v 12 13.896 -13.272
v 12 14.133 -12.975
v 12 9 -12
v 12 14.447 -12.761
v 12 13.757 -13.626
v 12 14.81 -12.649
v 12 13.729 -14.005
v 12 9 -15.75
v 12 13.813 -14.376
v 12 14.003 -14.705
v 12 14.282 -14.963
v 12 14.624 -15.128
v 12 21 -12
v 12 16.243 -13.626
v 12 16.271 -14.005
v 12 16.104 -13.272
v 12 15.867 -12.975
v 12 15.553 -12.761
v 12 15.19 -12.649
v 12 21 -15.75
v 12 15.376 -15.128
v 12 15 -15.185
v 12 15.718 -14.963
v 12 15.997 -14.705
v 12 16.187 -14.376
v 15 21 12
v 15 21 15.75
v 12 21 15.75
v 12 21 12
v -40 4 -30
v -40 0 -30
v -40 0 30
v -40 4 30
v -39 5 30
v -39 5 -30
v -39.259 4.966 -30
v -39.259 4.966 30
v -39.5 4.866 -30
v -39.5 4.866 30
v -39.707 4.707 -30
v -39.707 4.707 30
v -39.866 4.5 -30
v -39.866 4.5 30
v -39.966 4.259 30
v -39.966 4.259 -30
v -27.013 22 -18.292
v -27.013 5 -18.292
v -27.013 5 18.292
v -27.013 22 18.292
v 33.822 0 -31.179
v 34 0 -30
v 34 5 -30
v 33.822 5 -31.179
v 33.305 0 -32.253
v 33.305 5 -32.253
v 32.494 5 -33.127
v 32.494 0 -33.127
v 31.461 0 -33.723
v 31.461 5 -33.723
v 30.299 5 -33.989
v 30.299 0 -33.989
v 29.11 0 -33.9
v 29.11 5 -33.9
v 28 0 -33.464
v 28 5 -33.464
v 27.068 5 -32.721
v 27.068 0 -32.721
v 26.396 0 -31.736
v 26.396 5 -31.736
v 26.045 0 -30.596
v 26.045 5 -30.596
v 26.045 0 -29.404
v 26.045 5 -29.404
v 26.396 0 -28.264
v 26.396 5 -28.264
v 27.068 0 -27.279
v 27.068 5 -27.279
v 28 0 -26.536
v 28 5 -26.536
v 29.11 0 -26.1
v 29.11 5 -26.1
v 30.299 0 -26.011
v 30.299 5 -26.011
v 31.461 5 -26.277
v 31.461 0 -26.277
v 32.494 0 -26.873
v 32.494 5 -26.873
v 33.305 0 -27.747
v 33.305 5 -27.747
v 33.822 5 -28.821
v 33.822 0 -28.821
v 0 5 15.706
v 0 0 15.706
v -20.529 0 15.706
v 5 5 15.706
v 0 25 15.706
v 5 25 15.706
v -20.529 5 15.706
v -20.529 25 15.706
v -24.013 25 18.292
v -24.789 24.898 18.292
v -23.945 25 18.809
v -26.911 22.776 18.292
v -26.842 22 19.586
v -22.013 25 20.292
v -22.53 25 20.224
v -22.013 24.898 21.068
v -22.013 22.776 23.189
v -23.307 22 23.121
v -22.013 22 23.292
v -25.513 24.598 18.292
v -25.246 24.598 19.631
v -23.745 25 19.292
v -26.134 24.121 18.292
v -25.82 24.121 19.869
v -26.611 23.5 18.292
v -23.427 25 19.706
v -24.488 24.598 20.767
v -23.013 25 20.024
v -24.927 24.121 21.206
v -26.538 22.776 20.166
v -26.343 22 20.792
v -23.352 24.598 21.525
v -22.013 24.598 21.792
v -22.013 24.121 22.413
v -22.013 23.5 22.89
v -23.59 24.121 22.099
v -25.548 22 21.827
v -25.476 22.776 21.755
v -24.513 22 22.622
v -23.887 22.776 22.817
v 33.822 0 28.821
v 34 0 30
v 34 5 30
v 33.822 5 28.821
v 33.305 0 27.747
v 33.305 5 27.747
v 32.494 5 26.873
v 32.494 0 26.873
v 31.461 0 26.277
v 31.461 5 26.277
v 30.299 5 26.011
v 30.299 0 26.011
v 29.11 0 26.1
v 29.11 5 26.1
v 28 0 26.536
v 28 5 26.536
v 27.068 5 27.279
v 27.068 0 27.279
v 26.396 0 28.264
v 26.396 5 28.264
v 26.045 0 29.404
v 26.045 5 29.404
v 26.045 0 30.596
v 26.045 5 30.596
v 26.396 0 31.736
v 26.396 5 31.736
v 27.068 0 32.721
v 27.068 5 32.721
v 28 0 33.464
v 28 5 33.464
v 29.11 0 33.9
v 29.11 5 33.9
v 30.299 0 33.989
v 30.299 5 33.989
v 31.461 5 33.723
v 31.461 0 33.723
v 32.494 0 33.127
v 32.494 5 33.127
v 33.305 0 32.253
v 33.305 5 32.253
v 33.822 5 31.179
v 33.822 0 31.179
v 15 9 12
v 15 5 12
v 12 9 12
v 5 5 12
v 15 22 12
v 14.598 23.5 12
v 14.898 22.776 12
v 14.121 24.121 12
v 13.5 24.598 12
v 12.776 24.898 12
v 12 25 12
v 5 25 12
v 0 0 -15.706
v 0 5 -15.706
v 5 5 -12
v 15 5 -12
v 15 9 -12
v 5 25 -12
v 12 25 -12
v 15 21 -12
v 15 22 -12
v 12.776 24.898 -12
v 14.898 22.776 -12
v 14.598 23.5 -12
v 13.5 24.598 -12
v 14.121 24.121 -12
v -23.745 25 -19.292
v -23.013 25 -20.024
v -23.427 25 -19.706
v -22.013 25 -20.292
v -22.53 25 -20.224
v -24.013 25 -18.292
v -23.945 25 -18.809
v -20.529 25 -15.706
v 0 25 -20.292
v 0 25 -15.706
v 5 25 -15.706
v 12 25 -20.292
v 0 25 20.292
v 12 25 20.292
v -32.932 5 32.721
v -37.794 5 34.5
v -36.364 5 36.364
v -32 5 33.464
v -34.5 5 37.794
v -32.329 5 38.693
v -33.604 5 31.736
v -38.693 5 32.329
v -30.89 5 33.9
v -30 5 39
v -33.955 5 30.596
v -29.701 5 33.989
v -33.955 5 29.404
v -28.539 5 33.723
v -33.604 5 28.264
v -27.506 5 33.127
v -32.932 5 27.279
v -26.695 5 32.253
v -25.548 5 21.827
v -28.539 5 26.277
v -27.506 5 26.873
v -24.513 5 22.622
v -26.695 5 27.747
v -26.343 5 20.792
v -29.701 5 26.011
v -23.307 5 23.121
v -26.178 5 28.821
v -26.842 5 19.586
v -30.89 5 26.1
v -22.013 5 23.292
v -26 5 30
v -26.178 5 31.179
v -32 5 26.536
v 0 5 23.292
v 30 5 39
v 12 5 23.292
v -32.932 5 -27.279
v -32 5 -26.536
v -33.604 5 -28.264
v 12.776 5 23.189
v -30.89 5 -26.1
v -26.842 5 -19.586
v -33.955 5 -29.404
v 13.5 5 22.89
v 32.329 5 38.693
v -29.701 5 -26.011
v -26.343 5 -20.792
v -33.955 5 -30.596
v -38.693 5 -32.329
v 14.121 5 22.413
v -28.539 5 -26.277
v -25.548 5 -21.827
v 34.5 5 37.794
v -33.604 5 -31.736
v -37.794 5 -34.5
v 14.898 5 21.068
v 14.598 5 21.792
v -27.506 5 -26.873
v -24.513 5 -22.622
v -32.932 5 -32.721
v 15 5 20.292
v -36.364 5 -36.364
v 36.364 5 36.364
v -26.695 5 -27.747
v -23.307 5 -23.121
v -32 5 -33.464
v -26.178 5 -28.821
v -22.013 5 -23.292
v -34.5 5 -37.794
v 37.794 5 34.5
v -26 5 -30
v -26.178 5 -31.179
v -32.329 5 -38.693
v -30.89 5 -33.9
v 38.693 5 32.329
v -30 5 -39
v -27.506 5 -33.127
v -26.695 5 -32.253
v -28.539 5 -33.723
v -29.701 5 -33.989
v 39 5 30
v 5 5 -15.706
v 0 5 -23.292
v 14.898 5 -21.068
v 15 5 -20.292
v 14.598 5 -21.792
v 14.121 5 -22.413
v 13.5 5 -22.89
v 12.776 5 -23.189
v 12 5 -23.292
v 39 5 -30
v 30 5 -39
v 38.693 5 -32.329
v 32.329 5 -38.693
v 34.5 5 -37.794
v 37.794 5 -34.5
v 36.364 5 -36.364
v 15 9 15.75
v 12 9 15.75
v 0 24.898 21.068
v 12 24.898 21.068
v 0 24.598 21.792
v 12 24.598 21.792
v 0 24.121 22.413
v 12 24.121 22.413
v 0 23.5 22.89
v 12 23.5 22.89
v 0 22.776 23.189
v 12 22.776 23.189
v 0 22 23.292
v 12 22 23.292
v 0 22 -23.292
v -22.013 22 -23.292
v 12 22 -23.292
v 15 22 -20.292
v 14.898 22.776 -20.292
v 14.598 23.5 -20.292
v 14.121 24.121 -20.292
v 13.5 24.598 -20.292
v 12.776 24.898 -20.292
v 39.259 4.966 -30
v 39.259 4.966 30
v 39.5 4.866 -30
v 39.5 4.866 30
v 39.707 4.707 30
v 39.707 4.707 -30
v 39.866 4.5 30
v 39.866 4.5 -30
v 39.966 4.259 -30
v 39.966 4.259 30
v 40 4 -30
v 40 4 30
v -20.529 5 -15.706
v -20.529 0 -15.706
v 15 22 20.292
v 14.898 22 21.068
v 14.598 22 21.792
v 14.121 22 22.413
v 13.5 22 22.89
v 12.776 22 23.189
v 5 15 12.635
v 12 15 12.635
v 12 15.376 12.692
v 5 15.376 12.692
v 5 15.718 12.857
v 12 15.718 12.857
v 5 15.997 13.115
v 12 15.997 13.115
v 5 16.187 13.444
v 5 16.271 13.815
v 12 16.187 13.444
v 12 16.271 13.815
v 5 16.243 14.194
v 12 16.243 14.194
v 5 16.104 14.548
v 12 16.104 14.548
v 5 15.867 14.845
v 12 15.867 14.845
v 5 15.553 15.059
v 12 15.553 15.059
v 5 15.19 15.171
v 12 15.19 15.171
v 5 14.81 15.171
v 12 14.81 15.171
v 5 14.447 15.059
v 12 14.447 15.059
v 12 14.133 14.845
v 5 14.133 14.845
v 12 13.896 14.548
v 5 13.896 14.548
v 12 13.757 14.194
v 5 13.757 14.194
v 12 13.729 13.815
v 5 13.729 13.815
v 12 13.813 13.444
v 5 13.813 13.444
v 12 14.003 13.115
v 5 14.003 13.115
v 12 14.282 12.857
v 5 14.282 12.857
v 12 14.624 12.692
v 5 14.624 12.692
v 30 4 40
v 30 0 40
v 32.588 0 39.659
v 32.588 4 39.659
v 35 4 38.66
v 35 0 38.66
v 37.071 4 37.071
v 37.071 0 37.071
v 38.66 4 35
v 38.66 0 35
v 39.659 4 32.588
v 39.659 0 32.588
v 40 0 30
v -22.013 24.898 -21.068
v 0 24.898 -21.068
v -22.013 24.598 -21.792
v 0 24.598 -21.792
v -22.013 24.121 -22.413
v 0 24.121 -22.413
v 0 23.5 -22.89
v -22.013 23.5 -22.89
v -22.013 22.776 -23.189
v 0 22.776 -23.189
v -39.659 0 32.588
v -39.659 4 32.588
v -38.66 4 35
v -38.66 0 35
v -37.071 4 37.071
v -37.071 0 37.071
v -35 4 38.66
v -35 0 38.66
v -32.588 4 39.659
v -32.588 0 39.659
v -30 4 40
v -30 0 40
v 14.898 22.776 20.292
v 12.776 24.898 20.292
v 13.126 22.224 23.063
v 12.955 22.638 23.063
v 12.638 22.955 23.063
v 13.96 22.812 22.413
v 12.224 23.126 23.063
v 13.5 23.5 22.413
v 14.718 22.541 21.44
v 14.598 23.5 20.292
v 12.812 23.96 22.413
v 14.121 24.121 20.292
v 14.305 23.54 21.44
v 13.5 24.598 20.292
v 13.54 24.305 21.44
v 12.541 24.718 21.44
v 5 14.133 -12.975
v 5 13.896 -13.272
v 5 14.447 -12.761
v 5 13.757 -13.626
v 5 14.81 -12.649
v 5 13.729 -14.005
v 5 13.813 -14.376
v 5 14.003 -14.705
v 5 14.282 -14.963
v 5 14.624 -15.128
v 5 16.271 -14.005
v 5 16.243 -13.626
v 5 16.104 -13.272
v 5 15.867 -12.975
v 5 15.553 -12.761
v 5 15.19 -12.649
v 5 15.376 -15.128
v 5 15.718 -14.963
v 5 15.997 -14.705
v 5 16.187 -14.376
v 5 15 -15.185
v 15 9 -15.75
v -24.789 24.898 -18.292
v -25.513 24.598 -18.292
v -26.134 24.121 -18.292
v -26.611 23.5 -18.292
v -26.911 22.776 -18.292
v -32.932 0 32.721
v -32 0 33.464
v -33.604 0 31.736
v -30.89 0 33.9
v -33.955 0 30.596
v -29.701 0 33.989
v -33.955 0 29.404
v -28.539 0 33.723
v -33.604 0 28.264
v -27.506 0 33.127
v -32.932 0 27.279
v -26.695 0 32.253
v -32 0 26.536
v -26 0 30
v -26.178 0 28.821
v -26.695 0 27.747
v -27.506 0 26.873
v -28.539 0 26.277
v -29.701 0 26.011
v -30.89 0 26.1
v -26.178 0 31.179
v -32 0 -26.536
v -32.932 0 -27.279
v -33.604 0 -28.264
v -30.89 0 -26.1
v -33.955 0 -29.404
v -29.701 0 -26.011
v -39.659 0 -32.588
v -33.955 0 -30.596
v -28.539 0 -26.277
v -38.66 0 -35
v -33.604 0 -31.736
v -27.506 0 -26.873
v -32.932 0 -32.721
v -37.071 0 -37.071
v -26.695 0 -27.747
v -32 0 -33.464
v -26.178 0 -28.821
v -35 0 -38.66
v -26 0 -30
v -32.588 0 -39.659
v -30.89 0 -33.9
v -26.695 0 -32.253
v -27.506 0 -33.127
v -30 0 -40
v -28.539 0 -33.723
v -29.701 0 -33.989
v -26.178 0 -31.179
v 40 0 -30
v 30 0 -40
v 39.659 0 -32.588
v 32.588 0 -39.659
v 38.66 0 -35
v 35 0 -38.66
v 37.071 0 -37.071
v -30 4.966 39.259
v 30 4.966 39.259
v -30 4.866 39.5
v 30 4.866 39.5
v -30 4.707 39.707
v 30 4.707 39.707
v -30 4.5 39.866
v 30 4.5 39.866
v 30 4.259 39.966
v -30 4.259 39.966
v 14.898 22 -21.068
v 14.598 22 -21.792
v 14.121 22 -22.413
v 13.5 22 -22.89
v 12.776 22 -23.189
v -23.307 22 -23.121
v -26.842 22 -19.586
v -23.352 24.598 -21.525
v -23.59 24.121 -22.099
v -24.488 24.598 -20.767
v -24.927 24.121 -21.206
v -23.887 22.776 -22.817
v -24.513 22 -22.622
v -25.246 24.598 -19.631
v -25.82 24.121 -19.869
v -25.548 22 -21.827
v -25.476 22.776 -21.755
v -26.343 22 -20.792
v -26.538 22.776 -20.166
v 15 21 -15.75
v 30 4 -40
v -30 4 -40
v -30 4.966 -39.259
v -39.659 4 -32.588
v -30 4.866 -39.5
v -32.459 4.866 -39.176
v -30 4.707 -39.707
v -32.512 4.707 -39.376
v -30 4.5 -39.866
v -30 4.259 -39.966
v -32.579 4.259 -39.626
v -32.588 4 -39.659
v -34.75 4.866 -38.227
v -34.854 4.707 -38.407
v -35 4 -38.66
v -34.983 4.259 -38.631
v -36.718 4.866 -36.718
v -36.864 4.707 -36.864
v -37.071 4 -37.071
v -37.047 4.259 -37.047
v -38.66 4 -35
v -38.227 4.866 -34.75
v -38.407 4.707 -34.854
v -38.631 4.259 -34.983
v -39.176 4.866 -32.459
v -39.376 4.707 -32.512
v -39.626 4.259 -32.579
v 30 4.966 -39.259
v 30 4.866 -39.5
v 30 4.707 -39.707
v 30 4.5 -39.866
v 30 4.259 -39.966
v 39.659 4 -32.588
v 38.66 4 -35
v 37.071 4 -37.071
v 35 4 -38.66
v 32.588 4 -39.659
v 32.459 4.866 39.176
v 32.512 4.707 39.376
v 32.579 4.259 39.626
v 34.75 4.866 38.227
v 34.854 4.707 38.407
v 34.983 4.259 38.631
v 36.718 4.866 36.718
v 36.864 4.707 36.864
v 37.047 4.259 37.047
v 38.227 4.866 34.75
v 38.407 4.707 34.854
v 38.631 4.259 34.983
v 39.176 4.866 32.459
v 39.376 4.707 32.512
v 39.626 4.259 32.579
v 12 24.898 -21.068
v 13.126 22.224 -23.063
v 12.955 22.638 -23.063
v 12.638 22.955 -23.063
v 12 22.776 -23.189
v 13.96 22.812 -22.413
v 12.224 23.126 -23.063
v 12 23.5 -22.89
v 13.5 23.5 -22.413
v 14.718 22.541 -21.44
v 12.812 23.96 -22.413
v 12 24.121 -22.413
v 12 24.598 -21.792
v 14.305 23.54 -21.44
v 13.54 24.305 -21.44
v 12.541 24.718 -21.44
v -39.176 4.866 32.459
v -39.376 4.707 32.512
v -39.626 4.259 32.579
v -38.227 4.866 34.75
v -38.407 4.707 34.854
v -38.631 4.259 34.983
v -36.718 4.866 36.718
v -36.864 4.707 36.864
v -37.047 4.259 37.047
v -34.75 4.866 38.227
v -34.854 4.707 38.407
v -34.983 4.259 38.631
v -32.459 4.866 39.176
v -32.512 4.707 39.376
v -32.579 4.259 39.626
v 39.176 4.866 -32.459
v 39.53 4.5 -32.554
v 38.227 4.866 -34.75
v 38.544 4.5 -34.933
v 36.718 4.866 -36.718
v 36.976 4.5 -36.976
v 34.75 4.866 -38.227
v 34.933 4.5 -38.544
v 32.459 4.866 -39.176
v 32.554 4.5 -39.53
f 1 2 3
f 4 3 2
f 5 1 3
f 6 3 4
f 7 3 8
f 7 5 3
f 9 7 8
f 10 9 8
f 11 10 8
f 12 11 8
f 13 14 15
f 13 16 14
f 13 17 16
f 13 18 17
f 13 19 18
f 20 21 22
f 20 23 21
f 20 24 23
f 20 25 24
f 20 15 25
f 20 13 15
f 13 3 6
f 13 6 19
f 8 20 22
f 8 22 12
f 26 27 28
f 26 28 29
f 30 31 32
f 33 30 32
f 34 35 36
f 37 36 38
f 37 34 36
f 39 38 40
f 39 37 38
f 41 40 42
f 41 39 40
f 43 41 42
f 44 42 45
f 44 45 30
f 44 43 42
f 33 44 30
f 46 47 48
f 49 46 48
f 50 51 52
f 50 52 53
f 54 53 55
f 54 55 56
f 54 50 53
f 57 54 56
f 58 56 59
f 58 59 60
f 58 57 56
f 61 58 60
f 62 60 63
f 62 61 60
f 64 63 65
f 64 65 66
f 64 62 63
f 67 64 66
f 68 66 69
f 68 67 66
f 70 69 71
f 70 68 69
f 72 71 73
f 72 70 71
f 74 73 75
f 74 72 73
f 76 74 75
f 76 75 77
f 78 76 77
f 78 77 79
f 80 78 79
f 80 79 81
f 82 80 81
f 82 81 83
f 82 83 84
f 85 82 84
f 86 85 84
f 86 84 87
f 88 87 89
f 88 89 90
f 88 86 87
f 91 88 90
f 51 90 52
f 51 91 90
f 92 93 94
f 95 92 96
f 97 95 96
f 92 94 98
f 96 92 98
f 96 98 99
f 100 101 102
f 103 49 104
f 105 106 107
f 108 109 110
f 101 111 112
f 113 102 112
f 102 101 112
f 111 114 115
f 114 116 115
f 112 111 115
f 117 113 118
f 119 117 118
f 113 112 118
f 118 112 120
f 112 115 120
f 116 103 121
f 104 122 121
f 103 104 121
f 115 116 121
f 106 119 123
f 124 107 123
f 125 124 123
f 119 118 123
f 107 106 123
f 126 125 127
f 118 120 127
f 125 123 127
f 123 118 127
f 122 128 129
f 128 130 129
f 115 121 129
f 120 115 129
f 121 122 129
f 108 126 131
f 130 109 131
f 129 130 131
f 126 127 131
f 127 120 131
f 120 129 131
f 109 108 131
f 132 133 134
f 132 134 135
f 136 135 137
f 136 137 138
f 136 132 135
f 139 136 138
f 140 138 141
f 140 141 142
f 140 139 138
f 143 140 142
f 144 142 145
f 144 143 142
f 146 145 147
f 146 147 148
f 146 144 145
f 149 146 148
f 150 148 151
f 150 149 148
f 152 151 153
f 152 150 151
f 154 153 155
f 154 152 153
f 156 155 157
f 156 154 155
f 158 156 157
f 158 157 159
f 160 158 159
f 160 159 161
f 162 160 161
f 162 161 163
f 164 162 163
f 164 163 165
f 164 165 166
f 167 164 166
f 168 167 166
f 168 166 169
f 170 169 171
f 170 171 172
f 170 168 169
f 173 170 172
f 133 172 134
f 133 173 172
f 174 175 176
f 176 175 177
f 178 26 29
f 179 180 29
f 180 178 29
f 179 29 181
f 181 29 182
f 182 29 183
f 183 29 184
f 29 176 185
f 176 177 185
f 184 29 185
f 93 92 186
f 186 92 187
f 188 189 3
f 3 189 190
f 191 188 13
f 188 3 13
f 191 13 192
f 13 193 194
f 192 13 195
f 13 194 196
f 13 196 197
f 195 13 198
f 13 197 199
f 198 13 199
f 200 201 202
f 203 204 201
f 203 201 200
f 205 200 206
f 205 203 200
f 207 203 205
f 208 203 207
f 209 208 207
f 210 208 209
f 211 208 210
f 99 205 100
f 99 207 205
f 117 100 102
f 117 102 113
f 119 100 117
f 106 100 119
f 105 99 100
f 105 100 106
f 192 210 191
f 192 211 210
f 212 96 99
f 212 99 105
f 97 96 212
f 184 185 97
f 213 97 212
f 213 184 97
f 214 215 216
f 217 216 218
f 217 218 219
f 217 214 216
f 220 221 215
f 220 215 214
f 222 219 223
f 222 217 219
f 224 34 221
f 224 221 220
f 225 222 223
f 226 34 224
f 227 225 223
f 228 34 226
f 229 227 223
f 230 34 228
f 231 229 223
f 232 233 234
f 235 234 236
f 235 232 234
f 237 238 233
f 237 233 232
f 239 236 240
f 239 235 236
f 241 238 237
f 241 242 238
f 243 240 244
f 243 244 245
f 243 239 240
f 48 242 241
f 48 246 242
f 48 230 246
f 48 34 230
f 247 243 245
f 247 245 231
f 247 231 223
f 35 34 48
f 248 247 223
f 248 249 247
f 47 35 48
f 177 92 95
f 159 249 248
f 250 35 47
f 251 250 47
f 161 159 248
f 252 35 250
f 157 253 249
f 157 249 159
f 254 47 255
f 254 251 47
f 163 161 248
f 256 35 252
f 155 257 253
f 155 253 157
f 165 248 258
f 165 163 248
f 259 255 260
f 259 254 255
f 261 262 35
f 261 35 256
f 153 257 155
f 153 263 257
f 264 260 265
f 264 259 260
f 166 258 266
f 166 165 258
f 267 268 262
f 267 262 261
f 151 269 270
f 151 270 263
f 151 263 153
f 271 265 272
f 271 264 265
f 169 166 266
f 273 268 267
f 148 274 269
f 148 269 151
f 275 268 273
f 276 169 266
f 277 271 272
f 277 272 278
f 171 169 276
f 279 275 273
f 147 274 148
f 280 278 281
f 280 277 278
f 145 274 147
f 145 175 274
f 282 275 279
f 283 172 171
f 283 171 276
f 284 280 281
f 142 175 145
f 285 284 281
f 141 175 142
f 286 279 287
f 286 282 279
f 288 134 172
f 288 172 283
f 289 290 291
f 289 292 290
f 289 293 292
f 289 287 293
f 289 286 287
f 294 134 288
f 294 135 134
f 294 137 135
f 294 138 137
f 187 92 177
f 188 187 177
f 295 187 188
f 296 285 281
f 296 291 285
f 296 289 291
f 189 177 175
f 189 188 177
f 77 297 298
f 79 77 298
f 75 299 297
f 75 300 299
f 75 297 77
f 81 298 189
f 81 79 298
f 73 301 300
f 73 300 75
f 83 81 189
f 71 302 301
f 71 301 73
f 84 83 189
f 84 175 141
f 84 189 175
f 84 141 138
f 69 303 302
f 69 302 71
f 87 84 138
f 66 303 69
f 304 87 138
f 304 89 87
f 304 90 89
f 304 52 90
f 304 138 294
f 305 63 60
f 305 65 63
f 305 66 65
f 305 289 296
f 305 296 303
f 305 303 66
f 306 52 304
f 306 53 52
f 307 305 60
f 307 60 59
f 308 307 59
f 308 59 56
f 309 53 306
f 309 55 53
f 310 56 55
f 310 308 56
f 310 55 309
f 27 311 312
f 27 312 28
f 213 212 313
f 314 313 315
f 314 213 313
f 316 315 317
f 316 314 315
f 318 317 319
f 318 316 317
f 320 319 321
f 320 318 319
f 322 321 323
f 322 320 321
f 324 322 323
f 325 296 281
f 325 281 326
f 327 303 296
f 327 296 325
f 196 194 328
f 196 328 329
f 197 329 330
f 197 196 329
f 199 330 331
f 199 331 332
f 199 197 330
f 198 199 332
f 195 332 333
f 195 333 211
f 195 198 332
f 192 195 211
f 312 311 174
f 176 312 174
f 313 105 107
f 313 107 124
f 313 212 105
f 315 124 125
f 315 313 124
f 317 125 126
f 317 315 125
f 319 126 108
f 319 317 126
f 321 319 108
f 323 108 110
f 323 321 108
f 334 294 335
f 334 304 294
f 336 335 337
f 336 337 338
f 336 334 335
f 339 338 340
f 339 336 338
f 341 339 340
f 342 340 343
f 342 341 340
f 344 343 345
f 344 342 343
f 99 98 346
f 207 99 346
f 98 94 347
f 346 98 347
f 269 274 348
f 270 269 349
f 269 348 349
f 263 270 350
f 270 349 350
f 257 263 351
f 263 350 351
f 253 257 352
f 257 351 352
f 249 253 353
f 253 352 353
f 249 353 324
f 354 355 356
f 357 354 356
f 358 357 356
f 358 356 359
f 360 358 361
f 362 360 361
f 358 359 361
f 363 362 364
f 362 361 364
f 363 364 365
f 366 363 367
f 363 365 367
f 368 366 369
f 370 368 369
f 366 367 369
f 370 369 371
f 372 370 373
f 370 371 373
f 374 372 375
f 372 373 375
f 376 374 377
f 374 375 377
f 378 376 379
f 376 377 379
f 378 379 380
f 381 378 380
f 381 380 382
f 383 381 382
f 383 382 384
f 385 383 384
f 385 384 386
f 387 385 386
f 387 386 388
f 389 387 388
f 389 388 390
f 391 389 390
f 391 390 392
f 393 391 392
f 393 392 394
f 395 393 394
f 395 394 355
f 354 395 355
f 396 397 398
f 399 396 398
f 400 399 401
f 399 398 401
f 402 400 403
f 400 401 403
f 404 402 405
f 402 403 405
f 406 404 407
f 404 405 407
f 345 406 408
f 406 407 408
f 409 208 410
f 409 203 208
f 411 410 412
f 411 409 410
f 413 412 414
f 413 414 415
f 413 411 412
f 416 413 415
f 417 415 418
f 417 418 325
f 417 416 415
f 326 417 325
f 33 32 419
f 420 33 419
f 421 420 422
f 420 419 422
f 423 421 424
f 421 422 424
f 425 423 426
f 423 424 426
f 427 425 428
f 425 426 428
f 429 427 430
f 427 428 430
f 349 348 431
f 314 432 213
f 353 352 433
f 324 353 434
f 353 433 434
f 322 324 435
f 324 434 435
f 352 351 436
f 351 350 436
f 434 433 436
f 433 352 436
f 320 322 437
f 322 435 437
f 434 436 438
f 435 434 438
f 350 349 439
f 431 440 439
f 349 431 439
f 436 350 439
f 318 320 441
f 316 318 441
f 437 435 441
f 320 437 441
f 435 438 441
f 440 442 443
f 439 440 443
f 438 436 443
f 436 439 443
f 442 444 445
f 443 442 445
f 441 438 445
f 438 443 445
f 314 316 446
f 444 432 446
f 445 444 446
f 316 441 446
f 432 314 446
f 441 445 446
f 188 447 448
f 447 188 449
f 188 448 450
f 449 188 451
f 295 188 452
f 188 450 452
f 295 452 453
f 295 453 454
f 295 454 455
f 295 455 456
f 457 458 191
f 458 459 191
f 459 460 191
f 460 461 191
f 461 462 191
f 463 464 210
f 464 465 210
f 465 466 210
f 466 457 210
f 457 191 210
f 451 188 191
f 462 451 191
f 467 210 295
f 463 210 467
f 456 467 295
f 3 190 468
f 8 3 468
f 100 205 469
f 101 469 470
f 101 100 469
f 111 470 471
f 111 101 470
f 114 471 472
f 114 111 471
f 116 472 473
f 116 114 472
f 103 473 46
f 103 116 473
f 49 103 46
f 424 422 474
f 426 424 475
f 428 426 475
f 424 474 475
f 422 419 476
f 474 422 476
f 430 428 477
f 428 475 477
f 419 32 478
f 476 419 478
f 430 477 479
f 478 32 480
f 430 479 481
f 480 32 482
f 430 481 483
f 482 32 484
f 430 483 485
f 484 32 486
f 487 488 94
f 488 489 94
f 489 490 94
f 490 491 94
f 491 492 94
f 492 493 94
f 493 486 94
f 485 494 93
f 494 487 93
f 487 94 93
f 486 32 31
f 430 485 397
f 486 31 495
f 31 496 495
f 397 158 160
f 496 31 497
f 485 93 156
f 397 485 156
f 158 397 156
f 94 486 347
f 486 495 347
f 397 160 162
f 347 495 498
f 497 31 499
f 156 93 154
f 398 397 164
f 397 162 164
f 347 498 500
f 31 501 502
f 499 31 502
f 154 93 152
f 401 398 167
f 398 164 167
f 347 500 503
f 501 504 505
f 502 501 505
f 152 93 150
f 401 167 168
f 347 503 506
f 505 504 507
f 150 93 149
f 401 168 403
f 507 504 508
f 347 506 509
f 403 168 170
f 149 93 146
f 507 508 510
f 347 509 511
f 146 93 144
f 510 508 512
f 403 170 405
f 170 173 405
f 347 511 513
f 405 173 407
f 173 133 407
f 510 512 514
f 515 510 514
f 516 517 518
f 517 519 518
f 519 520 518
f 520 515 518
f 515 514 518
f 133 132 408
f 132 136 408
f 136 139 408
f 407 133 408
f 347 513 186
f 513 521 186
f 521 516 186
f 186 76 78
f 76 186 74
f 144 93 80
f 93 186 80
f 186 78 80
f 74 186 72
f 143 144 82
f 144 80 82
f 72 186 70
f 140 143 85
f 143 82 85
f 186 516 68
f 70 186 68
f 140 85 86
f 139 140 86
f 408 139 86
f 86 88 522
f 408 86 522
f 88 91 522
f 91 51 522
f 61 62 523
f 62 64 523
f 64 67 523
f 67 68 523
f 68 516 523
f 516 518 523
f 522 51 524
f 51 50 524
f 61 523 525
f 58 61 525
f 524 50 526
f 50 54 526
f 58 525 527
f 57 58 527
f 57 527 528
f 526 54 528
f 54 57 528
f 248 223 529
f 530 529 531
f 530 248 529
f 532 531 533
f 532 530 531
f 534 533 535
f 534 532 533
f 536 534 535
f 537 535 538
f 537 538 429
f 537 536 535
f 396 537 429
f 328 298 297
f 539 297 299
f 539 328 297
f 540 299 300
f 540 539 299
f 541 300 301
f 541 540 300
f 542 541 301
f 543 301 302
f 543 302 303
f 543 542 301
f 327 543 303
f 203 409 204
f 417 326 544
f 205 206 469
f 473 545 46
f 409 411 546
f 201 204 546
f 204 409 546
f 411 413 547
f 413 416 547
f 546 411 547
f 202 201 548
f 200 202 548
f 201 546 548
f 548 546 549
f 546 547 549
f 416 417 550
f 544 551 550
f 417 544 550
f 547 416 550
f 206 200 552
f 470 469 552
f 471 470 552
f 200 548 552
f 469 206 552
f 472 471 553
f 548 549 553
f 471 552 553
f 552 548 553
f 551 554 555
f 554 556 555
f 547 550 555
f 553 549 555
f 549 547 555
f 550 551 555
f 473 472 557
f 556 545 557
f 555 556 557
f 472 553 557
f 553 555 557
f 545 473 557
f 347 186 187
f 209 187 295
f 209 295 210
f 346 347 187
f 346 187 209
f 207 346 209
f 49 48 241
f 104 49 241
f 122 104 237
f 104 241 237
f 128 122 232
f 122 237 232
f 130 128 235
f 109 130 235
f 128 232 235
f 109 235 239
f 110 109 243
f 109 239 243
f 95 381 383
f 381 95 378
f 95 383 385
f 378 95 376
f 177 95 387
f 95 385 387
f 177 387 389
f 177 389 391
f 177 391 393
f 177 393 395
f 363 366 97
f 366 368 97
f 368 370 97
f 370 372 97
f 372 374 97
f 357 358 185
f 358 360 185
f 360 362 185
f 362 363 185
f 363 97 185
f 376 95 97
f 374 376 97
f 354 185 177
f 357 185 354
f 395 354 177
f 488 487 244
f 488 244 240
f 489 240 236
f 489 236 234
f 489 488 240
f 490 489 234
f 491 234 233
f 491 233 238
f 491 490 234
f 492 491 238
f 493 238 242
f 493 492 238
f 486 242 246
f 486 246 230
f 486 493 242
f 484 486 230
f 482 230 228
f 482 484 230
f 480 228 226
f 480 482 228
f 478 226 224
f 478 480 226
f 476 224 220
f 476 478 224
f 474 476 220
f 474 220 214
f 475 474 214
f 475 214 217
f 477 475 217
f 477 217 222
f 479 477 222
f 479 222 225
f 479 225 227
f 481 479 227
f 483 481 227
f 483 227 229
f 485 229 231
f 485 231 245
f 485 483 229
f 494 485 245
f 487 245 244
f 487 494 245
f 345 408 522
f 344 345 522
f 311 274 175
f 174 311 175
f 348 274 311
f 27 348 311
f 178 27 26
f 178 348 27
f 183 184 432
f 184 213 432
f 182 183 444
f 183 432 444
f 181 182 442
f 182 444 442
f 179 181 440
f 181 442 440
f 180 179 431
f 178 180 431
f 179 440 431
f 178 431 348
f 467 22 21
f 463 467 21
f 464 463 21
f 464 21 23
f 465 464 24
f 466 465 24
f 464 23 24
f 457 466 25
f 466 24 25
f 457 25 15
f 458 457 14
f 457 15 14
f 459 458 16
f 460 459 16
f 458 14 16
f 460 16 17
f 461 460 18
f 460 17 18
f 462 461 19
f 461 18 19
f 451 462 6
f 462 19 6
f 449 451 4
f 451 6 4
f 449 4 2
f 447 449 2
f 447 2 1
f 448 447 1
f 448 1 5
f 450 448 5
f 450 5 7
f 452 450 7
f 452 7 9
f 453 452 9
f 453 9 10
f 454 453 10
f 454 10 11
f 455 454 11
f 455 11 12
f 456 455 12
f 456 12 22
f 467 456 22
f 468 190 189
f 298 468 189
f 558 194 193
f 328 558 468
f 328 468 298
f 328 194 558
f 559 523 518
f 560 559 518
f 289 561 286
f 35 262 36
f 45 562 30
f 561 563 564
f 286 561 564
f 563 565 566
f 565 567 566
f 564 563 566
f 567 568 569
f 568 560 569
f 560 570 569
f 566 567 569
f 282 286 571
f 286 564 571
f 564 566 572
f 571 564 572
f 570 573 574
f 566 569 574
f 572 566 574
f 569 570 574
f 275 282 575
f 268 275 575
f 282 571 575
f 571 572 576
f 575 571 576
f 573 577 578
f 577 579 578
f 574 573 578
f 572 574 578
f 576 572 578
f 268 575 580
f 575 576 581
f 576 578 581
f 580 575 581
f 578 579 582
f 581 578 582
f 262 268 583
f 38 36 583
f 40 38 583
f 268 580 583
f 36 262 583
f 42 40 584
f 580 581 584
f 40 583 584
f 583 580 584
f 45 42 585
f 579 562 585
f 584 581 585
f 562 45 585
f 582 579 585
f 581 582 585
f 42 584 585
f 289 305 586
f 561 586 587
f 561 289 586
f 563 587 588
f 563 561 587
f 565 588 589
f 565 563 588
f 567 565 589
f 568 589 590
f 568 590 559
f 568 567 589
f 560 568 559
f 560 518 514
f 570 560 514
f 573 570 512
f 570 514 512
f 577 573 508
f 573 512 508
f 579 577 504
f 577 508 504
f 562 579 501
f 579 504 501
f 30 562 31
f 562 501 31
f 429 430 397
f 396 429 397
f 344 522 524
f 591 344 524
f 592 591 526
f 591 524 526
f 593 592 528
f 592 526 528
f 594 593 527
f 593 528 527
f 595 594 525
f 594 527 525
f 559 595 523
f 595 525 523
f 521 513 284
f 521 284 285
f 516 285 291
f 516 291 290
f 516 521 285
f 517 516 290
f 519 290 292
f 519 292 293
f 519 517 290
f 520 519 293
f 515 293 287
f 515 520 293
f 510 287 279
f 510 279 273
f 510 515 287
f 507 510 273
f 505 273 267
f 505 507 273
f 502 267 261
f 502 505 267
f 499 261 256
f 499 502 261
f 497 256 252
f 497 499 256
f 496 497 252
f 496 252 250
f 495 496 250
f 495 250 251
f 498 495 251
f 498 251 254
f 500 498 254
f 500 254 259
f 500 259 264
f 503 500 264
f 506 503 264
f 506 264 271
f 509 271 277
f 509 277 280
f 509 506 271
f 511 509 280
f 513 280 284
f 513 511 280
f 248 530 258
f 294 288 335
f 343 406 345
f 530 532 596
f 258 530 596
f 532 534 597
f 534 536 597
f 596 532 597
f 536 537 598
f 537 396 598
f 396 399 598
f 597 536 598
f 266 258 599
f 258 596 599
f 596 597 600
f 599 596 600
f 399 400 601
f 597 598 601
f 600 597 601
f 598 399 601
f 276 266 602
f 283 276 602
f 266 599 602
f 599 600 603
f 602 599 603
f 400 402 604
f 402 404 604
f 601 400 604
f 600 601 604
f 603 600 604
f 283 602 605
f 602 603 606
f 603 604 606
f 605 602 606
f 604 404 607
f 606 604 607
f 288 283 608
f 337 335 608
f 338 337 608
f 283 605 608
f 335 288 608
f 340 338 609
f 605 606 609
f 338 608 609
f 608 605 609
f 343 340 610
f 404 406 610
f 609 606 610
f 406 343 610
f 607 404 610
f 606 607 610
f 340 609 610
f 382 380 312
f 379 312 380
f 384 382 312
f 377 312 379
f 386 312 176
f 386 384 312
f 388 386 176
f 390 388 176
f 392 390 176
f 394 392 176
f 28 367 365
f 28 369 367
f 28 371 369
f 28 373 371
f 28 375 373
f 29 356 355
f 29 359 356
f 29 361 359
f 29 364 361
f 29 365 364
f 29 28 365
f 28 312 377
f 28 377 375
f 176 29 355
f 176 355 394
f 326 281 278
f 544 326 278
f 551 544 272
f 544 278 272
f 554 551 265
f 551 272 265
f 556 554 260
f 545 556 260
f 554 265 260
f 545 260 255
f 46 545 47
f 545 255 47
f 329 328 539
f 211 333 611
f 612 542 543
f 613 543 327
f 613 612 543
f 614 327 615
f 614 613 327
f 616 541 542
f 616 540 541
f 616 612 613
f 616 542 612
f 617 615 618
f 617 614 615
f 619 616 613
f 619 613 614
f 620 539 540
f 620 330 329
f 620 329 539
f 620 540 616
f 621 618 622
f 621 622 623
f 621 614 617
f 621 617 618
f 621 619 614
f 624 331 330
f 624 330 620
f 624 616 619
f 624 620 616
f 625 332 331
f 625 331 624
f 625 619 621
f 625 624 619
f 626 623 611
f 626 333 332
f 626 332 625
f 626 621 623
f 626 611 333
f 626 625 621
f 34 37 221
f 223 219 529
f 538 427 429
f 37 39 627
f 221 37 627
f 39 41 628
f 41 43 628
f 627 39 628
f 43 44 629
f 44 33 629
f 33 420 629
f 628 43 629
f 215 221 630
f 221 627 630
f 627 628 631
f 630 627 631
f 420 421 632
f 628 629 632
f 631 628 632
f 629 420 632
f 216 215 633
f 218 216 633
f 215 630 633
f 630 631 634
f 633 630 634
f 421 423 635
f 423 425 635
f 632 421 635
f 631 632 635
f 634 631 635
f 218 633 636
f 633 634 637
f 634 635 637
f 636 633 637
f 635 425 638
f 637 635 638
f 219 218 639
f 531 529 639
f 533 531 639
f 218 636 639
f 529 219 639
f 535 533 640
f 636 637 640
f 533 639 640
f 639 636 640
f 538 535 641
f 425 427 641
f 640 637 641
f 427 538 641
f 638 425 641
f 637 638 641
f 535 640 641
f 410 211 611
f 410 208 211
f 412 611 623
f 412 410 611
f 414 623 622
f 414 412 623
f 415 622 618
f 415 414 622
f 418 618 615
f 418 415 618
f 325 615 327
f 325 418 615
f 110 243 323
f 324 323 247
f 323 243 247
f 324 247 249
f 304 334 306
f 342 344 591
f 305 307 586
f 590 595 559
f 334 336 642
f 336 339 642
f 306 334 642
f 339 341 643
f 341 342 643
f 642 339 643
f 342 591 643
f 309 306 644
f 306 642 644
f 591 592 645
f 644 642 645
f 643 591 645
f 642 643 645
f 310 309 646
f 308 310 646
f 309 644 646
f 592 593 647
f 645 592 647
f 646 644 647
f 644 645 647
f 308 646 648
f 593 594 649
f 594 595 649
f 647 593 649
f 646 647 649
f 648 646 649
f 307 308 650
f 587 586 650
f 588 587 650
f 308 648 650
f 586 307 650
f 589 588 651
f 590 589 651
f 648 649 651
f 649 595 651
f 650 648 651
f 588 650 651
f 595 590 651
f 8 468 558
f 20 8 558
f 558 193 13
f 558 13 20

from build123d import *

# Parameters (mm, degrees)
SKETCH_1_R          = 4
EXTRUDE_1_DEPTH     = 5
SKETCH_2_W          = 20.529114817
SKETCH_2_H          = 31.412366712
CUT_EXTRUDE_1_DEPTH = 5
EXTRUDE_2_DEPTH     = 20
SKETCH_4_W          = 7.585483435
SKETCH_4_H          = 20
EXTRUDE_3_DEPTH     = 10
SKETCH_5_W          = 7.585483435
SKETCH_5_H          = 20
SKETCH_5_W_2        = 3.706183356
EXTRUDE_4_DEPTH     = 5
SKETCH_6_W          = 3.75
SKETCH_6_H          = 12
CUT_EXTRUDE_2_DEPTH = 3
CUT_EXTRUDE_3_REACH = 54
SKETCH_7_R          = 1.275
FILLET_1_R          = 3
FILLET_2_R          = 1


with BuildPart() as part:
    # 草图1 → 凸台-拉伸1 (new body)
    with BuildSketch(Plane(origin=(0, 0, 0), x_dir=(1, 0, 0), z_dir=(0, 1, 0))):
        with BuildLine():
            Line((30, 40), (-30, 40))
            ThreePointArc((-30, 40), (-37.071067812, 37.071067812), (-40, 30))
            Line((-40, 30), (-40, -30))
            ThreePointArc((-40, -30), (-37.071067812, -37.071067812), (-30, -40))
            Line((-30, -40), (30, -40))
            ThreePointArc((30, -40), (37.071067812, -37.071067812), (40, -30))
            Line((40, -30), (40, 30))
            ThreePointArc((40, 30), (37.071067812, 37.071067812), (30, 40))
        make_face()
        with Locations((-30, 30)):
            Circle(SKETCH_1_R, mode=Mode.SUBTRACT)
        with Locations((-30, -30)):
            Circle(SKETCH_1_R, mode=Mode.SUBTRACT)
        with Locations((30, -30)):
            Circle(SKETCH_1_R, mode=Mode.SUBTRACT)
        with Locations((30, 30)):
            Circle(SKETCH_1_R, mode=Mode.SUBTRACT)
    extrude(amount=EXTRUDE_1_DEPTH)

    # 草图2 → 切除-拉伸1 (cut)
    with BuildSketch(Plane(origin=(0, 5, 0), x_dir=(1, 0, 0), z_dir=(0, 1, 0))):
        with Locations((-10.264557408, 0)):
            Rectangle(SKETCH_2_W, SKETCH_2_H)
    extrude(amount=-CUT_EXTRUDE_1_DEPTH, mode=Mode.SUBTRACT)

    # 草图3 → 凸台-拉伸2 (add)
    with BuildSketch(Plane(origin=(0, 5, 0), x_dir=(1, 0, 0), z_dir=(0, 1, 0))):
        with BuildLine():
            Line((0, -15.706183356), (-20.529114817, -15.706183356))
            Line((-20.529114817, -15.706183356), (-20.529114817, 15.706183356))
            Line((-20.529114817, 15.706183356), (0, 15.706183356))
            Line((0, 15.706183356), (0, 23.291666791))
            Line((0, 23.291666791), (-22.012764878, 23.291666791))
            ThreePointArc((-22.012764878, 23.291666791), (-25.548298784, 21.827200697), (-27.012764878, 18.291666791))
            Line((-27.012764878, 18.291666791), (-27.012764878, -18.291666791))
            ThreePointArc((-27.012764878, -18.291666791), (-25.548298784, -21.827200697), (-22.012764878, -23.291666791))
            Line((-22.012764878, -23.291666791), (0, -23.291666791))
            Line((0, -23.291666791), (0, -15.706183356))
        make_face()
    extrude(amount=EXTRUDE_2_DEPTH)

    # 草图4 → 凸台-拉伸3 (add)
    with BuildSketch(Plane(origin=(0, 0, 0), x_dir=(0, 0, -1), z_dir=(1, 0, 0))):
        with Locations((19.498925074, 15)):
            Rectangle(SKETCH_4_W, SKETCH_4_H)
        with Locations((-19.498925074, 15)):
            Rectangle(SKETCH_4_W, SKETCH_4_H)
    extrude(amount=EXTRUDE_3_DEPTH)

    # 草图5 → 凸台-拉伸4 (add, symmetric)
    with BuildSketch(Plane(origin=(10, 0, 0), x_dir=(0, 0, -1), z_dir=(1, 0, 0))):
        with Locations((-19.498925074, 15)):
            Rectangle(SKETCH_5_W, SKETCH_5_H)
        with Locations((-13.853091678, 15)):
            Rectangle(SKETCH_5_W_2, SKETCH_5_H)
        with Locations((13.853091678, 15)):
            Rectangle(SKETCH_5_W_2, SKETCH_5_H)
        with Locations((19.498925074, 15)):
            Rectangle(SKETCH_5_W, SKETCH_5_H)
    extrude(amount=EXTRUDE_4_DEPTH, both=True)

    # 草图6 → 切除-拉伸2 (cut)
    with BuildSketch(Plane(origin=(15, 0, 0), x_dir=(0, 0, -1), z_dir=(1, 0, 0))):
        with Locations((-13.875, 15)):
            Rectangle(SKETCH_6_W, SKETCH_6_H)
        with Locations((13.875, 15)):
            Rectangle(SKETCH_6_W, SKETCH_6_H)
    extrude(amount=-CUT_EXTRUDE_2_DEPTH, mode=Mode.SUBTRACT)

    # 草图7 → 切除-拉伸3 (cut, up to next)
    with BuildSketch(Plane(origin=(12, 0, 0), x_dir=(0, 0, -1), z_dir=(1, 0, 0)), mode=Mode.PRIVATE) as cut_extrude_3_sk1:
        with Locations((-13.91, 15)):
            Circle(SKETCH_7_R)
    cut_extrude_3_tool1 = extrude(cut_extrude_3_sk1.sketch, amount=-CUT_EXTRUDE_3_REACH, mode=Mode.PRIVATE) & part.part
    add(cut_extrude_3_tool1.solids().sort_by_distance((12, 15, 13.91))[0], mode=Mode.SUBTRACT)
    # 草图7 → 切除-拉伸3 (cut, up to next)
    with BuildSketch(Plane(origin=(12, 0, 0), x_dir=(0, 0, -1), z_dir=(1, 0, 0)), mode=Mode.PRIVATE) as cut_extrude_3_sk2:
        with Locations((13.91, 15)):
            Circle(SKETCH_7_R)
    cut_extrude_3_tool2 = extrude(cut_extrude_3_sk2.sketch, amount=-CUT_EXTRUDE_3_REACH, mode=Mode.PRIVATE) & part.part
    add(cut_extrude_3_tool2.solids().sort_by_distance((12, 15, -13.91))[0], mode=Mode.SUBTRACT)

    # 圆角1
    fillet_1_edges = [part.edges().sort_by_distance(p)[0] for p in [
        (15, 25, 17.645833395),
        (15, 15, 23.291666791),
        (15, 25, -17.645833395),
        (15, 15, -23.291666791),
        (-27.012764878, 25, 0),
        (-25.548298784, 25, 21.827200697),
        (-3.506382439, 25, 23.291666791),
        (-3.506382439, 25, -23.291666791),
        (-25.548298784, 25, -21.827200697),
    ]]
    fillet(fillet_1_edges, radius=FILLET_1_R)

    # 圆角2
    fillet_2_edges = [part.edges().sort_by_distance(p)[0] for p in [
        (37.071067812, 5, -37.071067812),
        (0, 5, -40),
        (-37.071067812, 5, -37.071067812),
        (-40, 5, 0),
        (-37.071067812, 5, 37.071067812),
        (0, 5, 40),
        (37.071067812, 5, 37.071067812),
        (40, 5, 0),
    ]]
    fillet(fillet_2_edges, radius=FILLET_2_R)


solid = part.part
